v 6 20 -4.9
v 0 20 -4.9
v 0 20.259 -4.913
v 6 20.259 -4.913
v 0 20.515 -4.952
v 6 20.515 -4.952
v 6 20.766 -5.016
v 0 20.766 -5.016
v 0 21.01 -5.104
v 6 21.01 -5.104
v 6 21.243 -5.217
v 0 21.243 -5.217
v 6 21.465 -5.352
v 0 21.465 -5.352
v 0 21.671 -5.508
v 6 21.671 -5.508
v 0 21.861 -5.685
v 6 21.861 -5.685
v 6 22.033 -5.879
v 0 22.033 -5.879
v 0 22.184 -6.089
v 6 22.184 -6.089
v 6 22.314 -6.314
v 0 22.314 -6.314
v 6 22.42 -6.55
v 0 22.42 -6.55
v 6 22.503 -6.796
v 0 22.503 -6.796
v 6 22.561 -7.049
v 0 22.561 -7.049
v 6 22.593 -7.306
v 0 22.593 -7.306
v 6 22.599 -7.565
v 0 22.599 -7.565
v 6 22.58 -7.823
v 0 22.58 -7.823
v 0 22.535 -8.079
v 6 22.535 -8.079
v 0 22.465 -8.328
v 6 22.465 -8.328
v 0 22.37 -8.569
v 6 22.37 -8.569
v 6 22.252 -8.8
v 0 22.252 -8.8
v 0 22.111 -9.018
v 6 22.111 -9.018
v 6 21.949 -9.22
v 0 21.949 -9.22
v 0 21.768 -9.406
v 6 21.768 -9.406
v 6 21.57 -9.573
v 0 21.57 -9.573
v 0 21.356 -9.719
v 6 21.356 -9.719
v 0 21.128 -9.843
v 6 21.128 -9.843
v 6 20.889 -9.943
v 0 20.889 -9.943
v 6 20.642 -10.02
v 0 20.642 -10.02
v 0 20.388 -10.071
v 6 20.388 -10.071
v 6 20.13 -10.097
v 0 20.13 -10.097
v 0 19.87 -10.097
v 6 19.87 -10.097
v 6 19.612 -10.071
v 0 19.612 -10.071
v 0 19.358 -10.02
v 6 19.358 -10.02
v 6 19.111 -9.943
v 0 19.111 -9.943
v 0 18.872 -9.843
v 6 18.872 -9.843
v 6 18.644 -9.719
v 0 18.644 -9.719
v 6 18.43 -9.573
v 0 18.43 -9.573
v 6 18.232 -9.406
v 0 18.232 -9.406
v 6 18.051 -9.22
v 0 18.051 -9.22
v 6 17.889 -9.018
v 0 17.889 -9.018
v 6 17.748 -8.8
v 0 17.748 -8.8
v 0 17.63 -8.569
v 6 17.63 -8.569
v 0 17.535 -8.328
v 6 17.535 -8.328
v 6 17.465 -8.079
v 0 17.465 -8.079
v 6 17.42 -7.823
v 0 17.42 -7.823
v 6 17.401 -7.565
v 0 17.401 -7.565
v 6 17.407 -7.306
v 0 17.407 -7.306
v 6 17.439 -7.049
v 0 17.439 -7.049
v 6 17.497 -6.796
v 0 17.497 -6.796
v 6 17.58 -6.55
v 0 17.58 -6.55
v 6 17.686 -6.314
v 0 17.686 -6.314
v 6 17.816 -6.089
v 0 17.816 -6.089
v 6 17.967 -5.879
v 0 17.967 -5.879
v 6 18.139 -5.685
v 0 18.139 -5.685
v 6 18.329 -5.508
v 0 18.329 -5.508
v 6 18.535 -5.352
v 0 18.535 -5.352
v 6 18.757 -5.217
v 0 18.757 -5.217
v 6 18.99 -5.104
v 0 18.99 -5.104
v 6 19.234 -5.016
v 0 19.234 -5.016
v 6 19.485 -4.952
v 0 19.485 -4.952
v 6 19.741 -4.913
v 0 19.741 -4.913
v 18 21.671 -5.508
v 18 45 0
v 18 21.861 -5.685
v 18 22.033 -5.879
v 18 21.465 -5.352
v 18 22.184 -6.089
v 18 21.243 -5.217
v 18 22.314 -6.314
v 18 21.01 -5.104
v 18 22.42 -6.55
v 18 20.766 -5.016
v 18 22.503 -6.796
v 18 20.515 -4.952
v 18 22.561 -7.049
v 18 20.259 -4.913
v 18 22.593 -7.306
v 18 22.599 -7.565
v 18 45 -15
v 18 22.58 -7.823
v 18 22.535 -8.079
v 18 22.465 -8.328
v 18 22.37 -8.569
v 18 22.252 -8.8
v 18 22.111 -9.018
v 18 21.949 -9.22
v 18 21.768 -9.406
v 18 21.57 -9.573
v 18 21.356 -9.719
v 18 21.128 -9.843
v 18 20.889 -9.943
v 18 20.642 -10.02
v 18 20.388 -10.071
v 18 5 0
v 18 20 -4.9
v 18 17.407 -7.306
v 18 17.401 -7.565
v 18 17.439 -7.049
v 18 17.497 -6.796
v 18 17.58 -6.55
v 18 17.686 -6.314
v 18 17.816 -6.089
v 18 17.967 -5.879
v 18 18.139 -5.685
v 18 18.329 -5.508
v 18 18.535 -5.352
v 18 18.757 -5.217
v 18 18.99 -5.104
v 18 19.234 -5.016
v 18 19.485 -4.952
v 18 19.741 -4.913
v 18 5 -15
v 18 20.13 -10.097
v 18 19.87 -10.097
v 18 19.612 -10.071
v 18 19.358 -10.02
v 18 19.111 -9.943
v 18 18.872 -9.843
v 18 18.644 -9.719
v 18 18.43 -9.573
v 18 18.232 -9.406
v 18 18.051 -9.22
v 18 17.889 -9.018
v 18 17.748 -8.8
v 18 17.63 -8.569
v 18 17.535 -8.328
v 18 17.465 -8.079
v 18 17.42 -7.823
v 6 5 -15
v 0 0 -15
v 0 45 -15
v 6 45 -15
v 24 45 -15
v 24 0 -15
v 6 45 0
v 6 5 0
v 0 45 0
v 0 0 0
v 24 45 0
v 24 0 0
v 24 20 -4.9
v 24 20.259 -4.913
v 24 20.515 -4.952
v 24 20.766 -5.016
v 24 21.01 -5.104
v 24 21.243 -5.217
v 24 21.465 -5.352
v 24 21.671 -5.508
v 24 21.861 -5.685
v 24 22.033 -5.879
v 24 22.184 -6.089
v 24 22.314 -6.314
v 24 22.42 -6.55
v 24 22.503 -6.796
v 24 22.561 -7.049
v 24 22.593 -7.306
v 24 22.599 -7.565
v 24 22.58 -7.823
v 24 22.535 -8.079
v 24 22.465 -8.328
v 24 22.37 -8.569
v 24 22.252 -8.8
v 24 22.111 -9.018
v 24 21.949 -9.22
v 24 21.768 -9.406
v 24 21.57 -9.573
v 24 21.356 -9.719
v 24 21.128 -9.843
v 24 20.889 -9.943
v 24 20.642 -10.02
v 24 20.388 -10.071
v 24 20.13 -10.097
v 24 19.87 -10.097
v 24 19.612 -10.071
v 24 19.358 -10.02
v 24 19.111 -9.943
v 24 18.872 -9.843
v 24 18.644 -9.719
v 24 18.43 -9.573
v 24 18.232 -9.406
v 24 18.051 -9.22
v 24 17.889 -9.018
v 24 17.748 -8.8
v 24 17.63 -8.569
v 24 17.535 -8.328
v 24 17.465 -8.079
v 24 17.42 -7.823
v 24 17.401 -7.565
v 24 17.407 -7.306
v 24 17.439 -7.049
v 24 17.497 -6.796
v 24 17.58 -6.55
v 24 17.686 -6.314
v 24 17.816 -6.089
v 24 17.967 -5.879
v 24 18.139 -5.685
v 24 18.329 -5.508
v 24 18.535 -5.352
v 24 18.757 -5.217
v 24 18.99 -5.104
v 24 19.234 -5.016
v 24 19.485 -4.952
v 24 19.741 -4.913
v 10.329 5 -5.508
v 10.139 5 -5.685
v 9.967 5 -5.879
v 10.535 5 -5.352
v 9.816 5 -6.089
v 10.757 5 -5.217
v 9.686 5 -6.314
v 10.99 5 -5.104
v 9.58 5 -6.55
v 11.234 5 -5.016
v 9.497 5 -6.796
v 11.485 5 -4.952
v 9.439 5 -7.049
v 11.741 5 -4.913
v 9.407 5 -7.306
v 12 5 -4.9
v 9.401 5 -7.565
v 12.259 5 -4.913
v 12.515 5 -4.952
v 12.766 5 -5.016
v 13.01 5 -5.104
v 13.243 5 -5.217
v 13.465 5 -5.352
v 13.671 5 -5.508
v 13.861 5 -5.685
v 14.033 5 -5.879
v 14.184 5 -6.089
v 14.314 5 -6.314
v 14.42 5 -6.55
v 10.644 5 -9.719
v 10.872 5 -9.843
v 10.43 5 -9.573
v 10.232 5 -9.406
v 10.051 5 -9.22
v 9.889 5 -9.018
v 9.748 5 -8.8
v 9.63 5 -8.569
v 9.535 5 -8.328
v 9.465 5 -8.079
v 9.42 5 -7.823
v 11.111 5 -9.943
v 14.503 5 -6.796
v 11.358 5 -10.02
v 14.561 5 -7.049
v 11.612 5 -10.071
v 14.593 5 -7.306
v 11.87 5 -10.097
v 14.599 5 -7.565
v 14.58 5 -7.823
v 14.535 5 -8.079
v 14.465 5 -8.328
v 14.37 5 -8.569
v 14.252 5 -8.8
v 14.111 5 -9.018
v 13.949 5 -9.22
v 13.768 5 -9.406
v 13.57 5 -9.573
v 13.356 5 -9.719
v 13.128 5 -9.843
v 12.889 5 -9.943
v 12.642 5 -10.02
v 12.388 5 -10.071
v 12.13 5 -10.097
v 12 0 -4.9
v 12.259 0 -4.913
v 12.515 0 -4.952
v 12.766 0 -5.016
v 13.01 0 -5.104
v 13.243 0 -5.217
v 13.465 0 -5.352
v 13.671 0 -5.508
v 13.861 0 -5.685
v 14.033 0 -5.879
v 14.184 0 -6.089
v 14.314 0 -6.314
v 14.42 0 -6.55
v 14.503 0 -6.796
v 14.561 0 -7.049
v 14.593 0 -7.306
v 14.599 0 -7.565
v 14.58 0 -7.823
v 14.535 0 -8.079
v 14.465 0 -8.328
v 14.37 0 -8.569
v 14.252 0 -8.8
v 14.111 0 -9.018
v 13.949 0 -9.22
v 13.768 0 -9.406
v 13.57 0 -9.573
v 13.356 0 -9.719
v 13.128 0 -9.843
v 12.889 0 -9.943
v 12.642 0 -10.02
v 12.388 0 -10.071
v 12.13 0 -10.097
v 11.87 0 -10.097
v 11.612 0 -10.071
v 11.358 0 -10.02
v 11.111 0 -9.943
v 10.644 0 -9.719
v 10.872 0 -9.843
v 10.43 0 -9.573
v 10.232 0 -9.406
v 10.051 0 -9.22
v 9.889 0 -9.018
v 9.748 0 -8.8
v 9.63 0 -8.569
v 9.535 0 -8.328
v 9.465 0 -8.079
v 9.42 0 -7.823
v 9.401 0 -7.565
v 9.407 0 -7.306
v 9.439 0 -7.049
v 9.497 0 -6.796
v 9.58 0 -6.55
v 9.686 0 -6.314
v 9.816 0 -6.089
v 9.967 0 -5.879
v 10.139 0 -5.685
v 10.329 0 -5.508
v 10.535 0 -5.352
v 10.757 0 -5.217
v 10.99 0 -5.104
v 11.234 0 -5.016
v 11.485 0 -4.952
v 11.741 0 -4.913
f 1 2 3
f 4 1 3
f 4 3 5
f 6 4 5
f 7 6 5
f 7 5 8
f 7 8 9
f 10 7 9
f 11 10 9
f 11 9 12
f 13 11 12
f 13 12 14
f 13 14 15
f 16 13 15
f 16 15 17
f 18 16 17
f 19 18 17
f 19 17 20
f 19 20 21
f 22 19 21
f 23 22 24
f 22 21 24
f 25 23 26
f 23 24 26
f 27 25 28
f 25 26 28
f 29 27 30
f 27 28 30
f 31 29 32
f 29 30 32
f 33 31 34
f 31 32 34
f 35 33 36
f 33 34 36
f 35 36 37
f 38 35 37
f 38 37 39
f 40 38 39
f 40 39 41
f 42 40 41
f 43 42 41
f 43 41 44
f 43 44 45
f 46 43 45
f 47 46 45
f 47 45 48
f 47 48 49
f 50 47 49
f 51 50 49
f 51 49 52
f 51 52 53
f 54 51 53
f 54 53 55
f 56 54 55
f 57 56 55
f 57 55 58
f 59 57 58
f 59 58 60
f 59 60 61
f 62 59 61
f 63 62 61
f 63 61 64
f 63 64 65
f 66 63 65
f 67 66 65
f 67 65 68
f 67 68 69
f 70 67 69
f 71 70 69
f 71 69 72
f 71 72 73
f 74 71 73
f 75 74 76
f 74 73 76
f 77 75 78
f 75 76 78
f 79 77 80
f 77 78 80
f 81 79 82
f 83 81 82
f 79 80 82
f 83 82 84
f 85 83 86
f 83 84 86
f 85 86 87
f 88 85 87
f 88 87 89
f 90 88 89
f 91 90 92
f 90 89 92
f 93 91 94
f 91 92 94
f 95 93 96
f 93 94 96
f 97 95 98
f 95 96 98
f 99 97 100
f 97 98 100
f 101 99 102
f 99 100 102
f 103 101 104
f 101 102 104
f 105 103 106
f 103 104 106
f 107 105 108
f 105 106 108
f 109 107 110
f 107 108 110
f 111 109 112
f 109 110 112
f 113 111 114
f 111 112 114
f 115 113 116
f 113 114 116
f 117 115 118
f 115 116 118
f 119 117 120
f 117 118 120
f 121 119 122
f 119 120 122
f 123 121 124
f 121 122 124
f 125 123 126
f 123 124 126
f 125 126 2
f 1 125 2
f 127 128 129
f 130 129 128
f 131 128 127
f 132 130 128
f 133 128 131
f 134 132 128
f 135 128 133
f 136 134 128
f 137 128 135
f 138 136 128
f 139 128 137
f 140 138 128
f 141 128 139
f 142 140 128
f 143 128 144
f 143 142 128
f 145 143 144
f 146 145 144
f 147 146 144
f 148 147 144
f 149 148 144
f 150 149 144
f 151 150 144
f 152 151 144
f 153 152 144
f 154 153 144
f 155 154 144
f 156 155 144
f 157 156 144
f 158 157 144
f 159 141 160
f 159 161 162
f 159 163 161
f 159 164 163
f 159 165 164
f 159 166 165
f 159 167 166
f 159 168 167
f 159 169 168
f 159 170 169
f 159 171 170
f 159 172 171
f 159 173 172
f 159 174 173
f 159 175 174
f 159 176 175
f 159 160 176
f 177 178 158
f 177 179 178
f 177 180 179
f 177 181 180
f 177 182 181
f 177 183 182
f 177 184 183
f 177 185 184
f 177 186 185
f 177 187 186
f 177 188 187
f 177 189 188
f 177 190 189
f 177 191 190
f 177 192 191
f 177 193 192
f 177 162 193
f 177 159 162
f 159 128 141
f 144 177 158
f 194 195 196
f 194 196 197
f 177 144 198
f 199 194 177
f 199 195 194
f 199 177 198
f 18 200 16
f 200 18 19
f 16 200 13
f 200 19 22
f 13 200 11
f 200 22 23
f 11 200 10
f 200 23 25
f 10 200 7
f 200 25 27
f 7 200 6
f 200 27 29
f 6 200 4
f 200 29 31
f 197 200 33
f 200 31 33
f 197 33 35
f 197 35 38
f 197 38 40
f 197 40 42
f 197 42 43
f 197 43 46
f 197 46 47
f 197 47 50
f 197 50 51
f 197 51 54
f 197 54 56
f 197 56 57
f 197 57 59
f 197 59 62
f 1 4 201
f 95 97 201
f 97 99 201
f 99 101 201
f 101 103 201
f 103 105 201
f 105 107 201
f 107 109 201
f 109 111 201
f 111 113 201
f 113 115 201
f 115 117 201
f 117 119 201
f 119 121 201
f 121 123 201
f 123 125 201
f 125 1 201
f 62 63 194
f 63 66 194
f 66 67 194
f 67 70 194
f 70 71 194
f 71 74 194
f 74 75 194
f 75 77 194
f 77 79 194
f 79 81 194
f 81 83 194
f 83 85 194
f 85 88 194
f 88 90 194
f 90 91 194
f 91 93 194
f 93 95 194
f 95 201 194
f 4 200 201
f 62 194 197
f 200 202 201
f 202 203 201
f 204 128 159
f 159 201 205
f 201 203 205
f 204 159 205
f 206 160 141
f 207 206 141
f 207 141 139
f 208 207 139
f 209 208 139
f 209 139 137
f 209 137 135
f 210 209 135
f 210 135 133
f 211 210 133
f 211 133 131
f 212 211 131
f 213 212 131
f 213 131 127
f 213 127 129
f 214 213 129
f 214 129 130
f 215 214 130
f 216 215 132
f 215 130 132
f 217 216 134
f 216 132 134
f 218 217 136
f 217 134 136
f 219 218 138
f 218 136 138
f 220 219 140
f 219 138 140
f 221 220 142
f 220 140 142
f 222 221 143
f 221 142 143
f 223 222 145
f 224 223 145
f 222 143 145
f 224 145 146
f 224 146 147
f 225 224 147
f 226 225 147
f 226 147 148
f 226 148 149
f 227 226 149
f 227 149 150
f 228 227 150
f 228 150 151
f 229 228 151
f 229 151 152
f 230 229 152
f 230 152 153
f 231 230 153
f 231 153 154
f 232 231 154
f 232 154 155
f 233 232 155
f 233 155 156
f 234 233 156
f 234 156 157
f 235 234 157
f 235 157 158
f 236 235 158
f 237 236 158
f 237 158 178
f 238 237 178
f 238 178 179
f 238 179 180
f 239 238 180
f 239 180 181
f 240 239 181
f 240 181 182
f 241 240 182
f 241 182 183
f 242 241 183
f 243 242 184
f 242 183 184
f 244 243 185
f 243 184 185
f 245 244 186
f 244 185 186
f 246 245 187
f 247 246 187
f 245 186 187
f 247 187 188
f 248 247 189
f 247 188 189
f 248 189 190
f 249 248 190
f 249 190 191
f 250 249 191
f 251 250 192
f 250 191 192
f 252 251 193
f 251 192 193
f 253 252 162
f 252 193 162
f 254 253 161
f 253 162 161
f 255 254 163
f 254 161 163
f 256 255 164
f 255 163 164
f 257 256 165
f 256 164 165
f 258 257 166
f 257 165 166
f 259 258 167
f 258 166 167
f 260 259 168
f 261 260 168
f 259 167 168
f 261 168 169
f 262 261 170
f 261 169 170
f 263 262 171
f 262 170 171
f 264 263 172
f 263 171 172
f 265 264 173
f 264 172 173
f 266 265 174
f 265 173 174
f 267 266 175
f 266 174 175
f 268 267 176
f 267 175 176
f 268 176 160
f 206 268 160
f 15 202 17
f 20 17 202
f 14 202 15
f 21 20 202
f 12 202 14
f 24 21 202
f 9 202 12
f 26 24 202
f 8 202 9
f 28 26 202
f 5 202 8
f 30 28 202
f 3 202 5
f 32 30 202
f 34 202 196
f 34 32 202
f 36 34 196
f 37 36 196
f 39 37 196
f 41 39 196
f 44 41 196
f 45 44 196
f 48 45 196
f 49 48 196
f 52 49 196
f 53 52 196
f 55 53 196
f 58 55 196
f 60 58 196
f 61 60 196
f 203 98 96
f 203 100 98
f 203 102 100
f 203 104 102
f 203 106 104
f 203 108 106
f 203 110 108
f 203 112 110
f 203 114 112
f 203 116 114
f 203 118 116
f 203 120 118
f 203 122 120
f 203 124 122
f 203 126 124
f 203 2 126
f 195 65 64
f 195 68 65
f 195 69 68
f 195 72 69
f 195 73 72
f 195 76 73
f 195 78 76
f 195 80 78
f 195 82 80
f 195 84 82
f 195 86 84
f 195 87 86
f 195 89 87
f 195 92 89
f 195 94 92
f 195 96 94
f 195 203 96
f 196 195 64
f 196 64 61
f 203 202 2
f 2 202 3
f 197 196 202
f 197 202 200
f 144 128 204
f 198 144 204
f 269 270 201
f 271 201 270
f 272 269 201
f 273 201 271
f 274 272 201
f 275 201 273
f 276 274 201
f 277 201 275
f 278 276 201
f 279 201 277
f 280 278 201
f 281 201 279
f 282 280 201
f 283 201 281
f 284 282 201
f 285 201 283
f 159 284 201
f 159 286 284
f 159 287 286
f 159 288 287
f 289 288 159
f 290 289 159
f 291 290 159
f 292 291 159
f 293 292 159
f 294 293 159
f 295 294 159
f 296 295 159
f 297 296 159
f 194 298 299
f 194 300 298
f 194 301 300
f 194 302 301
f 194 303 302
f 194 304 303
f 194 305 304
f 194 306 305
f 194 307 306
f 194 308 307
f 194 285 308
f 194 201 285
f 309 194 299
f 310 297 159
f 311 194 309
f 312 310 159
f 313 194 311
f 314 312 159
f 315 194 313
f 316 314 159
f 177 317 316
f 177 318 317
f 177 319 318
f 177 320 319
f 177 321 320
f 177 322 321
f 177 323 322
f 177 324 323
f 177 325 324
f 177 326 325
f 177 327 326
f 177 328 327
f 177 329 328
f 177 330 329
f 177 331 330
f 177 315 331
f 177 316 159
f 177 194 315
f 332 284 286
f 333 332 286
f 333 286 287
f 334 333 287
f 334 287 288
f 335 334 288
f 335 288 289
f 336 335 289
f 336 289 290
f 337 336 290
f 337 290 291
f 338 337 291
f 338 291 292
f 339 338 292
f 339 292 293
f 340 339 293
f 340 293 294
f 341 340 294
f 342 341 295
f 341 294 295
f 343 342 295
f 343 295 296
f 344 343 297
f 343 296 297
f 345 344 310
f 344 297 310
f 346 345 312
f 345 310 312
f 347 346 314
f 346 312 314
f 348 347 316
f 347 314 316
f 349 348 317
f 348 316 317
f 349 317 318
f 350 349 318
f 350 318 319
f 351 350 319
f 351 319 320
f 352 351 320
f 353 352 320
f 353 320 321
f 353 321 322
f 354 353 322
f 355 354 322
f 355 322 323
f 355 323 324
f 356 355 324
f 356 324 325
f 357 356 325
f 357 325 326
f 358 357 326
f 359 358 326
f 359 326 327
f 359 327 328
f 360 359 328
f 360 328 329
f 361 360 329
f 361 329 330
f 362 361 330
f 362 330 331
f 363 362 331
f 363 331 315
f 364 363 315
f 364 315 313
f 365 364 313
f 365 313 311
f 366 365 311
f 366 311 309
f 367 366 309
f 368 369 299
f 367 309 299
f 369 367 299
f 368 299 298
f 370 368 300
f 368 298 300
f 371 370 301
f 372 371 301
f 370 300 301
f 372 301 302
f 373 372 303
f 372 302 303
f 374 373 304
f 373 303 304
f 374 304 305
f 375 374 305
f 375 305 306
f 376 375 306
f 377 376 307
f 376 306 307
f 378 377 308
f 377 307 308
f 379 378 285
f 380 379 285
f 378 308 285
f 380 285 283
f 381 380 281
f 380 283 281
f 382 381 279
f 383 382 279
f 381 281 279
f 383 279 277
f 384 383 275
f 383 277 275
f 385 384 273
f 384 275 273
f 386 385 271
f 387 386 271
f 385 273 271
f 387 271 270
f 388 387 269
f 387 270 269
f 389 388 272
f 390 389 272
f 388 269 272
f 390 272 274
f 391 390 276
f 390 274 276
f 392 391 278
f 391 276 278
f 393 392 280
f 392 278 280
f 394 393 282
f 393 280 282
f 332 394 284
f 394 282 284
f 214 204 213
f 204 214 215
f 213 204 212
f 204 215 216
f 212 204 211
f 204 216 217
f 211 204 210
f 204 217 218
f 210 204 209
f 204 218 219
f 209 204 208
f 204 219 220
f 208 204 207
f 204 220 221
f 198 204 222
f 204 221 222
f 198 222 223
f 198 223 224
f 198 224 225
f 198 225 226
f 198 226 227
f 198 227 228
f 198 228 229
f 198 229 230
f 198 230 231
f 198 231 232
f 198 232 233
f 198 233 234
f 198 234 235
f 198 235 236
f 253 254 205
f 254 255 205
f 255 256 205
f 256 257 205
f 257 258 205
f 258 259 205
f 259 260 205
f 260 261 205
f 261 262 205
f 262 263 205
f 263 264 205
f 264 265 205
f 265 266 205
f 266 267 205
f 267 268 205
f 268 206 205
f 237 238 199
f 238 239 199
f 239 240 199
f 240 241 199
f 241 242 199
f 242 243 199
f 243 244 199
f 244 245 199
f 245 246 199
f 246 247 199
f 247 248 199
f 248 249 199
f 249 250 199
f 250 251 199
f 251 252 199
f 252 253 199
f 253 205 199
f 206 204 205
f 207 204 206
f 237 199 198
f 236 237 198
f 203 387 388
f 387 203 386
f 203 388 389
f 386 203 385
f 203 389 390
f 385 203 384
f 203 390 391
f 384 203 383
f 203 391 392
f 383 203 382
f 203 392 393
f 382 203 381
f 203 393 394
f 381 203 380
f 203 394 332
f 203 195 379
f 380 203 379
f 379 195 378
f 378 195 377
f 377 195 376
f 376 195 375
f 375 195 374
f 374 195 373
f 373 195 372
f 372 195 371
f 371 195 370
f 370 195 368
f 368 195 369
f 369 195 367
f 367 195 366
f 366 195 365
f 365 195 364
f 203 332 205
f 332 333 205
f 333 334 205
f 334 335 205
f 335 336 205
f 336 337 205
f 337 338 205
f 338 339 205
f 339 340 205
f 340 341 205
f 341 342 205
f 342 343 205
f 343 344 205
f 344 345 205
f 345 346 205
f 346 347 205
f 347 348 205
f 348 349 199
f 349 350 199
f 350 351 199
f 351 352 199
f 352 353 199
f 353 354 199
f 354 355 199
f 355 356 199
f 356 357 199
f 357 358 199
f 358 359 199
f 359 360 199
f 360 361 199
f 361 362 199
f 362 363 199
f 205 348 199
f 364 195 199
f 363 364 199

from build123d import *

# Parameters (mm, degrees)
SKETCH_5_W          = 24
SKETCH_5_H          = 15
EXTRUDE_5_DEPTH     = 5
CUT_EXTRUDE_6_REACH = 30.74
SKETCH_6_R          = 2.6
SKETCH_7_W          = 6
SKETCH_7_H          = 15
EXTRUDE_7_DEPTH     = 40
SKETCH_8_R          = 2.6
CUT_EXTRUDE_8_DEPTH = 54.16013544


with BuildPart() as part:
    # Эскиз5 → Вытянуть5 (new body)
    with BuildSketch(Plane(origin=(0, 0, 0), x_dir=(1, 0, 0), z_dir=(0, 1, 0))):
        with Locations((12, 7.5)):
            Rectangle(SKETCH_5_W, SKETCH_5_H)
    extrude(amount=EXTRUDE_5_DEPTH)

    # Эскиз6 → Вытянуть6 (cut, up to next)
    with BuildSketch(Plane(origin=(0, 5, 0), x_dir=(1, 0, 0), z_dir=(0, 1, 0)), mode=Mode.PRIVATE) as cut_extrude_6_sk1:
        with Locations(Location((12, 7.5, 0), (0, 0, 270))):
            Circle(SKETCH_6_R)
    cut_extrude_6_tool1 = extrude(cut_extrude_6_sk1.sketch, amount=-CUT_EXTRUDE_6_REACH, mode=Mode.PRIVATE) & part.part
    add(cut_extrude_6_tool1.solids().sort_by_distance((12, 5, -7.5))[0], mode=Mode.SUBTRACT)

    # Эскиз7 → Вытянуть7 (add)
    with BuildSketch(Plane(origin=(0, 5, 0), x_dir=(1, 0, 0), z_dir=(0, 1, 0))):
        with Locations((3, 7.5)):
            Rectangle(SKETCH_7_W, SKETCH_7_H)
        with Locations((21, 7.5)):
            Rectangle(SKETCH_7_W, SKETCH_7_H)
    extrude(amount=EXTRUDE_7_DEPTH)

    # Эскиз8 → Вытянуть8 (cut, through all)
    with BuildSketch(Plane.ZY):
        with Locations((-7.5, 20)):
            Circle(SKETCH_8_R)
    extrude(amount=-CUT_EXTRUDE_8_DEPTH, mode=Mode.SUBTRACT)


solid = part.part
